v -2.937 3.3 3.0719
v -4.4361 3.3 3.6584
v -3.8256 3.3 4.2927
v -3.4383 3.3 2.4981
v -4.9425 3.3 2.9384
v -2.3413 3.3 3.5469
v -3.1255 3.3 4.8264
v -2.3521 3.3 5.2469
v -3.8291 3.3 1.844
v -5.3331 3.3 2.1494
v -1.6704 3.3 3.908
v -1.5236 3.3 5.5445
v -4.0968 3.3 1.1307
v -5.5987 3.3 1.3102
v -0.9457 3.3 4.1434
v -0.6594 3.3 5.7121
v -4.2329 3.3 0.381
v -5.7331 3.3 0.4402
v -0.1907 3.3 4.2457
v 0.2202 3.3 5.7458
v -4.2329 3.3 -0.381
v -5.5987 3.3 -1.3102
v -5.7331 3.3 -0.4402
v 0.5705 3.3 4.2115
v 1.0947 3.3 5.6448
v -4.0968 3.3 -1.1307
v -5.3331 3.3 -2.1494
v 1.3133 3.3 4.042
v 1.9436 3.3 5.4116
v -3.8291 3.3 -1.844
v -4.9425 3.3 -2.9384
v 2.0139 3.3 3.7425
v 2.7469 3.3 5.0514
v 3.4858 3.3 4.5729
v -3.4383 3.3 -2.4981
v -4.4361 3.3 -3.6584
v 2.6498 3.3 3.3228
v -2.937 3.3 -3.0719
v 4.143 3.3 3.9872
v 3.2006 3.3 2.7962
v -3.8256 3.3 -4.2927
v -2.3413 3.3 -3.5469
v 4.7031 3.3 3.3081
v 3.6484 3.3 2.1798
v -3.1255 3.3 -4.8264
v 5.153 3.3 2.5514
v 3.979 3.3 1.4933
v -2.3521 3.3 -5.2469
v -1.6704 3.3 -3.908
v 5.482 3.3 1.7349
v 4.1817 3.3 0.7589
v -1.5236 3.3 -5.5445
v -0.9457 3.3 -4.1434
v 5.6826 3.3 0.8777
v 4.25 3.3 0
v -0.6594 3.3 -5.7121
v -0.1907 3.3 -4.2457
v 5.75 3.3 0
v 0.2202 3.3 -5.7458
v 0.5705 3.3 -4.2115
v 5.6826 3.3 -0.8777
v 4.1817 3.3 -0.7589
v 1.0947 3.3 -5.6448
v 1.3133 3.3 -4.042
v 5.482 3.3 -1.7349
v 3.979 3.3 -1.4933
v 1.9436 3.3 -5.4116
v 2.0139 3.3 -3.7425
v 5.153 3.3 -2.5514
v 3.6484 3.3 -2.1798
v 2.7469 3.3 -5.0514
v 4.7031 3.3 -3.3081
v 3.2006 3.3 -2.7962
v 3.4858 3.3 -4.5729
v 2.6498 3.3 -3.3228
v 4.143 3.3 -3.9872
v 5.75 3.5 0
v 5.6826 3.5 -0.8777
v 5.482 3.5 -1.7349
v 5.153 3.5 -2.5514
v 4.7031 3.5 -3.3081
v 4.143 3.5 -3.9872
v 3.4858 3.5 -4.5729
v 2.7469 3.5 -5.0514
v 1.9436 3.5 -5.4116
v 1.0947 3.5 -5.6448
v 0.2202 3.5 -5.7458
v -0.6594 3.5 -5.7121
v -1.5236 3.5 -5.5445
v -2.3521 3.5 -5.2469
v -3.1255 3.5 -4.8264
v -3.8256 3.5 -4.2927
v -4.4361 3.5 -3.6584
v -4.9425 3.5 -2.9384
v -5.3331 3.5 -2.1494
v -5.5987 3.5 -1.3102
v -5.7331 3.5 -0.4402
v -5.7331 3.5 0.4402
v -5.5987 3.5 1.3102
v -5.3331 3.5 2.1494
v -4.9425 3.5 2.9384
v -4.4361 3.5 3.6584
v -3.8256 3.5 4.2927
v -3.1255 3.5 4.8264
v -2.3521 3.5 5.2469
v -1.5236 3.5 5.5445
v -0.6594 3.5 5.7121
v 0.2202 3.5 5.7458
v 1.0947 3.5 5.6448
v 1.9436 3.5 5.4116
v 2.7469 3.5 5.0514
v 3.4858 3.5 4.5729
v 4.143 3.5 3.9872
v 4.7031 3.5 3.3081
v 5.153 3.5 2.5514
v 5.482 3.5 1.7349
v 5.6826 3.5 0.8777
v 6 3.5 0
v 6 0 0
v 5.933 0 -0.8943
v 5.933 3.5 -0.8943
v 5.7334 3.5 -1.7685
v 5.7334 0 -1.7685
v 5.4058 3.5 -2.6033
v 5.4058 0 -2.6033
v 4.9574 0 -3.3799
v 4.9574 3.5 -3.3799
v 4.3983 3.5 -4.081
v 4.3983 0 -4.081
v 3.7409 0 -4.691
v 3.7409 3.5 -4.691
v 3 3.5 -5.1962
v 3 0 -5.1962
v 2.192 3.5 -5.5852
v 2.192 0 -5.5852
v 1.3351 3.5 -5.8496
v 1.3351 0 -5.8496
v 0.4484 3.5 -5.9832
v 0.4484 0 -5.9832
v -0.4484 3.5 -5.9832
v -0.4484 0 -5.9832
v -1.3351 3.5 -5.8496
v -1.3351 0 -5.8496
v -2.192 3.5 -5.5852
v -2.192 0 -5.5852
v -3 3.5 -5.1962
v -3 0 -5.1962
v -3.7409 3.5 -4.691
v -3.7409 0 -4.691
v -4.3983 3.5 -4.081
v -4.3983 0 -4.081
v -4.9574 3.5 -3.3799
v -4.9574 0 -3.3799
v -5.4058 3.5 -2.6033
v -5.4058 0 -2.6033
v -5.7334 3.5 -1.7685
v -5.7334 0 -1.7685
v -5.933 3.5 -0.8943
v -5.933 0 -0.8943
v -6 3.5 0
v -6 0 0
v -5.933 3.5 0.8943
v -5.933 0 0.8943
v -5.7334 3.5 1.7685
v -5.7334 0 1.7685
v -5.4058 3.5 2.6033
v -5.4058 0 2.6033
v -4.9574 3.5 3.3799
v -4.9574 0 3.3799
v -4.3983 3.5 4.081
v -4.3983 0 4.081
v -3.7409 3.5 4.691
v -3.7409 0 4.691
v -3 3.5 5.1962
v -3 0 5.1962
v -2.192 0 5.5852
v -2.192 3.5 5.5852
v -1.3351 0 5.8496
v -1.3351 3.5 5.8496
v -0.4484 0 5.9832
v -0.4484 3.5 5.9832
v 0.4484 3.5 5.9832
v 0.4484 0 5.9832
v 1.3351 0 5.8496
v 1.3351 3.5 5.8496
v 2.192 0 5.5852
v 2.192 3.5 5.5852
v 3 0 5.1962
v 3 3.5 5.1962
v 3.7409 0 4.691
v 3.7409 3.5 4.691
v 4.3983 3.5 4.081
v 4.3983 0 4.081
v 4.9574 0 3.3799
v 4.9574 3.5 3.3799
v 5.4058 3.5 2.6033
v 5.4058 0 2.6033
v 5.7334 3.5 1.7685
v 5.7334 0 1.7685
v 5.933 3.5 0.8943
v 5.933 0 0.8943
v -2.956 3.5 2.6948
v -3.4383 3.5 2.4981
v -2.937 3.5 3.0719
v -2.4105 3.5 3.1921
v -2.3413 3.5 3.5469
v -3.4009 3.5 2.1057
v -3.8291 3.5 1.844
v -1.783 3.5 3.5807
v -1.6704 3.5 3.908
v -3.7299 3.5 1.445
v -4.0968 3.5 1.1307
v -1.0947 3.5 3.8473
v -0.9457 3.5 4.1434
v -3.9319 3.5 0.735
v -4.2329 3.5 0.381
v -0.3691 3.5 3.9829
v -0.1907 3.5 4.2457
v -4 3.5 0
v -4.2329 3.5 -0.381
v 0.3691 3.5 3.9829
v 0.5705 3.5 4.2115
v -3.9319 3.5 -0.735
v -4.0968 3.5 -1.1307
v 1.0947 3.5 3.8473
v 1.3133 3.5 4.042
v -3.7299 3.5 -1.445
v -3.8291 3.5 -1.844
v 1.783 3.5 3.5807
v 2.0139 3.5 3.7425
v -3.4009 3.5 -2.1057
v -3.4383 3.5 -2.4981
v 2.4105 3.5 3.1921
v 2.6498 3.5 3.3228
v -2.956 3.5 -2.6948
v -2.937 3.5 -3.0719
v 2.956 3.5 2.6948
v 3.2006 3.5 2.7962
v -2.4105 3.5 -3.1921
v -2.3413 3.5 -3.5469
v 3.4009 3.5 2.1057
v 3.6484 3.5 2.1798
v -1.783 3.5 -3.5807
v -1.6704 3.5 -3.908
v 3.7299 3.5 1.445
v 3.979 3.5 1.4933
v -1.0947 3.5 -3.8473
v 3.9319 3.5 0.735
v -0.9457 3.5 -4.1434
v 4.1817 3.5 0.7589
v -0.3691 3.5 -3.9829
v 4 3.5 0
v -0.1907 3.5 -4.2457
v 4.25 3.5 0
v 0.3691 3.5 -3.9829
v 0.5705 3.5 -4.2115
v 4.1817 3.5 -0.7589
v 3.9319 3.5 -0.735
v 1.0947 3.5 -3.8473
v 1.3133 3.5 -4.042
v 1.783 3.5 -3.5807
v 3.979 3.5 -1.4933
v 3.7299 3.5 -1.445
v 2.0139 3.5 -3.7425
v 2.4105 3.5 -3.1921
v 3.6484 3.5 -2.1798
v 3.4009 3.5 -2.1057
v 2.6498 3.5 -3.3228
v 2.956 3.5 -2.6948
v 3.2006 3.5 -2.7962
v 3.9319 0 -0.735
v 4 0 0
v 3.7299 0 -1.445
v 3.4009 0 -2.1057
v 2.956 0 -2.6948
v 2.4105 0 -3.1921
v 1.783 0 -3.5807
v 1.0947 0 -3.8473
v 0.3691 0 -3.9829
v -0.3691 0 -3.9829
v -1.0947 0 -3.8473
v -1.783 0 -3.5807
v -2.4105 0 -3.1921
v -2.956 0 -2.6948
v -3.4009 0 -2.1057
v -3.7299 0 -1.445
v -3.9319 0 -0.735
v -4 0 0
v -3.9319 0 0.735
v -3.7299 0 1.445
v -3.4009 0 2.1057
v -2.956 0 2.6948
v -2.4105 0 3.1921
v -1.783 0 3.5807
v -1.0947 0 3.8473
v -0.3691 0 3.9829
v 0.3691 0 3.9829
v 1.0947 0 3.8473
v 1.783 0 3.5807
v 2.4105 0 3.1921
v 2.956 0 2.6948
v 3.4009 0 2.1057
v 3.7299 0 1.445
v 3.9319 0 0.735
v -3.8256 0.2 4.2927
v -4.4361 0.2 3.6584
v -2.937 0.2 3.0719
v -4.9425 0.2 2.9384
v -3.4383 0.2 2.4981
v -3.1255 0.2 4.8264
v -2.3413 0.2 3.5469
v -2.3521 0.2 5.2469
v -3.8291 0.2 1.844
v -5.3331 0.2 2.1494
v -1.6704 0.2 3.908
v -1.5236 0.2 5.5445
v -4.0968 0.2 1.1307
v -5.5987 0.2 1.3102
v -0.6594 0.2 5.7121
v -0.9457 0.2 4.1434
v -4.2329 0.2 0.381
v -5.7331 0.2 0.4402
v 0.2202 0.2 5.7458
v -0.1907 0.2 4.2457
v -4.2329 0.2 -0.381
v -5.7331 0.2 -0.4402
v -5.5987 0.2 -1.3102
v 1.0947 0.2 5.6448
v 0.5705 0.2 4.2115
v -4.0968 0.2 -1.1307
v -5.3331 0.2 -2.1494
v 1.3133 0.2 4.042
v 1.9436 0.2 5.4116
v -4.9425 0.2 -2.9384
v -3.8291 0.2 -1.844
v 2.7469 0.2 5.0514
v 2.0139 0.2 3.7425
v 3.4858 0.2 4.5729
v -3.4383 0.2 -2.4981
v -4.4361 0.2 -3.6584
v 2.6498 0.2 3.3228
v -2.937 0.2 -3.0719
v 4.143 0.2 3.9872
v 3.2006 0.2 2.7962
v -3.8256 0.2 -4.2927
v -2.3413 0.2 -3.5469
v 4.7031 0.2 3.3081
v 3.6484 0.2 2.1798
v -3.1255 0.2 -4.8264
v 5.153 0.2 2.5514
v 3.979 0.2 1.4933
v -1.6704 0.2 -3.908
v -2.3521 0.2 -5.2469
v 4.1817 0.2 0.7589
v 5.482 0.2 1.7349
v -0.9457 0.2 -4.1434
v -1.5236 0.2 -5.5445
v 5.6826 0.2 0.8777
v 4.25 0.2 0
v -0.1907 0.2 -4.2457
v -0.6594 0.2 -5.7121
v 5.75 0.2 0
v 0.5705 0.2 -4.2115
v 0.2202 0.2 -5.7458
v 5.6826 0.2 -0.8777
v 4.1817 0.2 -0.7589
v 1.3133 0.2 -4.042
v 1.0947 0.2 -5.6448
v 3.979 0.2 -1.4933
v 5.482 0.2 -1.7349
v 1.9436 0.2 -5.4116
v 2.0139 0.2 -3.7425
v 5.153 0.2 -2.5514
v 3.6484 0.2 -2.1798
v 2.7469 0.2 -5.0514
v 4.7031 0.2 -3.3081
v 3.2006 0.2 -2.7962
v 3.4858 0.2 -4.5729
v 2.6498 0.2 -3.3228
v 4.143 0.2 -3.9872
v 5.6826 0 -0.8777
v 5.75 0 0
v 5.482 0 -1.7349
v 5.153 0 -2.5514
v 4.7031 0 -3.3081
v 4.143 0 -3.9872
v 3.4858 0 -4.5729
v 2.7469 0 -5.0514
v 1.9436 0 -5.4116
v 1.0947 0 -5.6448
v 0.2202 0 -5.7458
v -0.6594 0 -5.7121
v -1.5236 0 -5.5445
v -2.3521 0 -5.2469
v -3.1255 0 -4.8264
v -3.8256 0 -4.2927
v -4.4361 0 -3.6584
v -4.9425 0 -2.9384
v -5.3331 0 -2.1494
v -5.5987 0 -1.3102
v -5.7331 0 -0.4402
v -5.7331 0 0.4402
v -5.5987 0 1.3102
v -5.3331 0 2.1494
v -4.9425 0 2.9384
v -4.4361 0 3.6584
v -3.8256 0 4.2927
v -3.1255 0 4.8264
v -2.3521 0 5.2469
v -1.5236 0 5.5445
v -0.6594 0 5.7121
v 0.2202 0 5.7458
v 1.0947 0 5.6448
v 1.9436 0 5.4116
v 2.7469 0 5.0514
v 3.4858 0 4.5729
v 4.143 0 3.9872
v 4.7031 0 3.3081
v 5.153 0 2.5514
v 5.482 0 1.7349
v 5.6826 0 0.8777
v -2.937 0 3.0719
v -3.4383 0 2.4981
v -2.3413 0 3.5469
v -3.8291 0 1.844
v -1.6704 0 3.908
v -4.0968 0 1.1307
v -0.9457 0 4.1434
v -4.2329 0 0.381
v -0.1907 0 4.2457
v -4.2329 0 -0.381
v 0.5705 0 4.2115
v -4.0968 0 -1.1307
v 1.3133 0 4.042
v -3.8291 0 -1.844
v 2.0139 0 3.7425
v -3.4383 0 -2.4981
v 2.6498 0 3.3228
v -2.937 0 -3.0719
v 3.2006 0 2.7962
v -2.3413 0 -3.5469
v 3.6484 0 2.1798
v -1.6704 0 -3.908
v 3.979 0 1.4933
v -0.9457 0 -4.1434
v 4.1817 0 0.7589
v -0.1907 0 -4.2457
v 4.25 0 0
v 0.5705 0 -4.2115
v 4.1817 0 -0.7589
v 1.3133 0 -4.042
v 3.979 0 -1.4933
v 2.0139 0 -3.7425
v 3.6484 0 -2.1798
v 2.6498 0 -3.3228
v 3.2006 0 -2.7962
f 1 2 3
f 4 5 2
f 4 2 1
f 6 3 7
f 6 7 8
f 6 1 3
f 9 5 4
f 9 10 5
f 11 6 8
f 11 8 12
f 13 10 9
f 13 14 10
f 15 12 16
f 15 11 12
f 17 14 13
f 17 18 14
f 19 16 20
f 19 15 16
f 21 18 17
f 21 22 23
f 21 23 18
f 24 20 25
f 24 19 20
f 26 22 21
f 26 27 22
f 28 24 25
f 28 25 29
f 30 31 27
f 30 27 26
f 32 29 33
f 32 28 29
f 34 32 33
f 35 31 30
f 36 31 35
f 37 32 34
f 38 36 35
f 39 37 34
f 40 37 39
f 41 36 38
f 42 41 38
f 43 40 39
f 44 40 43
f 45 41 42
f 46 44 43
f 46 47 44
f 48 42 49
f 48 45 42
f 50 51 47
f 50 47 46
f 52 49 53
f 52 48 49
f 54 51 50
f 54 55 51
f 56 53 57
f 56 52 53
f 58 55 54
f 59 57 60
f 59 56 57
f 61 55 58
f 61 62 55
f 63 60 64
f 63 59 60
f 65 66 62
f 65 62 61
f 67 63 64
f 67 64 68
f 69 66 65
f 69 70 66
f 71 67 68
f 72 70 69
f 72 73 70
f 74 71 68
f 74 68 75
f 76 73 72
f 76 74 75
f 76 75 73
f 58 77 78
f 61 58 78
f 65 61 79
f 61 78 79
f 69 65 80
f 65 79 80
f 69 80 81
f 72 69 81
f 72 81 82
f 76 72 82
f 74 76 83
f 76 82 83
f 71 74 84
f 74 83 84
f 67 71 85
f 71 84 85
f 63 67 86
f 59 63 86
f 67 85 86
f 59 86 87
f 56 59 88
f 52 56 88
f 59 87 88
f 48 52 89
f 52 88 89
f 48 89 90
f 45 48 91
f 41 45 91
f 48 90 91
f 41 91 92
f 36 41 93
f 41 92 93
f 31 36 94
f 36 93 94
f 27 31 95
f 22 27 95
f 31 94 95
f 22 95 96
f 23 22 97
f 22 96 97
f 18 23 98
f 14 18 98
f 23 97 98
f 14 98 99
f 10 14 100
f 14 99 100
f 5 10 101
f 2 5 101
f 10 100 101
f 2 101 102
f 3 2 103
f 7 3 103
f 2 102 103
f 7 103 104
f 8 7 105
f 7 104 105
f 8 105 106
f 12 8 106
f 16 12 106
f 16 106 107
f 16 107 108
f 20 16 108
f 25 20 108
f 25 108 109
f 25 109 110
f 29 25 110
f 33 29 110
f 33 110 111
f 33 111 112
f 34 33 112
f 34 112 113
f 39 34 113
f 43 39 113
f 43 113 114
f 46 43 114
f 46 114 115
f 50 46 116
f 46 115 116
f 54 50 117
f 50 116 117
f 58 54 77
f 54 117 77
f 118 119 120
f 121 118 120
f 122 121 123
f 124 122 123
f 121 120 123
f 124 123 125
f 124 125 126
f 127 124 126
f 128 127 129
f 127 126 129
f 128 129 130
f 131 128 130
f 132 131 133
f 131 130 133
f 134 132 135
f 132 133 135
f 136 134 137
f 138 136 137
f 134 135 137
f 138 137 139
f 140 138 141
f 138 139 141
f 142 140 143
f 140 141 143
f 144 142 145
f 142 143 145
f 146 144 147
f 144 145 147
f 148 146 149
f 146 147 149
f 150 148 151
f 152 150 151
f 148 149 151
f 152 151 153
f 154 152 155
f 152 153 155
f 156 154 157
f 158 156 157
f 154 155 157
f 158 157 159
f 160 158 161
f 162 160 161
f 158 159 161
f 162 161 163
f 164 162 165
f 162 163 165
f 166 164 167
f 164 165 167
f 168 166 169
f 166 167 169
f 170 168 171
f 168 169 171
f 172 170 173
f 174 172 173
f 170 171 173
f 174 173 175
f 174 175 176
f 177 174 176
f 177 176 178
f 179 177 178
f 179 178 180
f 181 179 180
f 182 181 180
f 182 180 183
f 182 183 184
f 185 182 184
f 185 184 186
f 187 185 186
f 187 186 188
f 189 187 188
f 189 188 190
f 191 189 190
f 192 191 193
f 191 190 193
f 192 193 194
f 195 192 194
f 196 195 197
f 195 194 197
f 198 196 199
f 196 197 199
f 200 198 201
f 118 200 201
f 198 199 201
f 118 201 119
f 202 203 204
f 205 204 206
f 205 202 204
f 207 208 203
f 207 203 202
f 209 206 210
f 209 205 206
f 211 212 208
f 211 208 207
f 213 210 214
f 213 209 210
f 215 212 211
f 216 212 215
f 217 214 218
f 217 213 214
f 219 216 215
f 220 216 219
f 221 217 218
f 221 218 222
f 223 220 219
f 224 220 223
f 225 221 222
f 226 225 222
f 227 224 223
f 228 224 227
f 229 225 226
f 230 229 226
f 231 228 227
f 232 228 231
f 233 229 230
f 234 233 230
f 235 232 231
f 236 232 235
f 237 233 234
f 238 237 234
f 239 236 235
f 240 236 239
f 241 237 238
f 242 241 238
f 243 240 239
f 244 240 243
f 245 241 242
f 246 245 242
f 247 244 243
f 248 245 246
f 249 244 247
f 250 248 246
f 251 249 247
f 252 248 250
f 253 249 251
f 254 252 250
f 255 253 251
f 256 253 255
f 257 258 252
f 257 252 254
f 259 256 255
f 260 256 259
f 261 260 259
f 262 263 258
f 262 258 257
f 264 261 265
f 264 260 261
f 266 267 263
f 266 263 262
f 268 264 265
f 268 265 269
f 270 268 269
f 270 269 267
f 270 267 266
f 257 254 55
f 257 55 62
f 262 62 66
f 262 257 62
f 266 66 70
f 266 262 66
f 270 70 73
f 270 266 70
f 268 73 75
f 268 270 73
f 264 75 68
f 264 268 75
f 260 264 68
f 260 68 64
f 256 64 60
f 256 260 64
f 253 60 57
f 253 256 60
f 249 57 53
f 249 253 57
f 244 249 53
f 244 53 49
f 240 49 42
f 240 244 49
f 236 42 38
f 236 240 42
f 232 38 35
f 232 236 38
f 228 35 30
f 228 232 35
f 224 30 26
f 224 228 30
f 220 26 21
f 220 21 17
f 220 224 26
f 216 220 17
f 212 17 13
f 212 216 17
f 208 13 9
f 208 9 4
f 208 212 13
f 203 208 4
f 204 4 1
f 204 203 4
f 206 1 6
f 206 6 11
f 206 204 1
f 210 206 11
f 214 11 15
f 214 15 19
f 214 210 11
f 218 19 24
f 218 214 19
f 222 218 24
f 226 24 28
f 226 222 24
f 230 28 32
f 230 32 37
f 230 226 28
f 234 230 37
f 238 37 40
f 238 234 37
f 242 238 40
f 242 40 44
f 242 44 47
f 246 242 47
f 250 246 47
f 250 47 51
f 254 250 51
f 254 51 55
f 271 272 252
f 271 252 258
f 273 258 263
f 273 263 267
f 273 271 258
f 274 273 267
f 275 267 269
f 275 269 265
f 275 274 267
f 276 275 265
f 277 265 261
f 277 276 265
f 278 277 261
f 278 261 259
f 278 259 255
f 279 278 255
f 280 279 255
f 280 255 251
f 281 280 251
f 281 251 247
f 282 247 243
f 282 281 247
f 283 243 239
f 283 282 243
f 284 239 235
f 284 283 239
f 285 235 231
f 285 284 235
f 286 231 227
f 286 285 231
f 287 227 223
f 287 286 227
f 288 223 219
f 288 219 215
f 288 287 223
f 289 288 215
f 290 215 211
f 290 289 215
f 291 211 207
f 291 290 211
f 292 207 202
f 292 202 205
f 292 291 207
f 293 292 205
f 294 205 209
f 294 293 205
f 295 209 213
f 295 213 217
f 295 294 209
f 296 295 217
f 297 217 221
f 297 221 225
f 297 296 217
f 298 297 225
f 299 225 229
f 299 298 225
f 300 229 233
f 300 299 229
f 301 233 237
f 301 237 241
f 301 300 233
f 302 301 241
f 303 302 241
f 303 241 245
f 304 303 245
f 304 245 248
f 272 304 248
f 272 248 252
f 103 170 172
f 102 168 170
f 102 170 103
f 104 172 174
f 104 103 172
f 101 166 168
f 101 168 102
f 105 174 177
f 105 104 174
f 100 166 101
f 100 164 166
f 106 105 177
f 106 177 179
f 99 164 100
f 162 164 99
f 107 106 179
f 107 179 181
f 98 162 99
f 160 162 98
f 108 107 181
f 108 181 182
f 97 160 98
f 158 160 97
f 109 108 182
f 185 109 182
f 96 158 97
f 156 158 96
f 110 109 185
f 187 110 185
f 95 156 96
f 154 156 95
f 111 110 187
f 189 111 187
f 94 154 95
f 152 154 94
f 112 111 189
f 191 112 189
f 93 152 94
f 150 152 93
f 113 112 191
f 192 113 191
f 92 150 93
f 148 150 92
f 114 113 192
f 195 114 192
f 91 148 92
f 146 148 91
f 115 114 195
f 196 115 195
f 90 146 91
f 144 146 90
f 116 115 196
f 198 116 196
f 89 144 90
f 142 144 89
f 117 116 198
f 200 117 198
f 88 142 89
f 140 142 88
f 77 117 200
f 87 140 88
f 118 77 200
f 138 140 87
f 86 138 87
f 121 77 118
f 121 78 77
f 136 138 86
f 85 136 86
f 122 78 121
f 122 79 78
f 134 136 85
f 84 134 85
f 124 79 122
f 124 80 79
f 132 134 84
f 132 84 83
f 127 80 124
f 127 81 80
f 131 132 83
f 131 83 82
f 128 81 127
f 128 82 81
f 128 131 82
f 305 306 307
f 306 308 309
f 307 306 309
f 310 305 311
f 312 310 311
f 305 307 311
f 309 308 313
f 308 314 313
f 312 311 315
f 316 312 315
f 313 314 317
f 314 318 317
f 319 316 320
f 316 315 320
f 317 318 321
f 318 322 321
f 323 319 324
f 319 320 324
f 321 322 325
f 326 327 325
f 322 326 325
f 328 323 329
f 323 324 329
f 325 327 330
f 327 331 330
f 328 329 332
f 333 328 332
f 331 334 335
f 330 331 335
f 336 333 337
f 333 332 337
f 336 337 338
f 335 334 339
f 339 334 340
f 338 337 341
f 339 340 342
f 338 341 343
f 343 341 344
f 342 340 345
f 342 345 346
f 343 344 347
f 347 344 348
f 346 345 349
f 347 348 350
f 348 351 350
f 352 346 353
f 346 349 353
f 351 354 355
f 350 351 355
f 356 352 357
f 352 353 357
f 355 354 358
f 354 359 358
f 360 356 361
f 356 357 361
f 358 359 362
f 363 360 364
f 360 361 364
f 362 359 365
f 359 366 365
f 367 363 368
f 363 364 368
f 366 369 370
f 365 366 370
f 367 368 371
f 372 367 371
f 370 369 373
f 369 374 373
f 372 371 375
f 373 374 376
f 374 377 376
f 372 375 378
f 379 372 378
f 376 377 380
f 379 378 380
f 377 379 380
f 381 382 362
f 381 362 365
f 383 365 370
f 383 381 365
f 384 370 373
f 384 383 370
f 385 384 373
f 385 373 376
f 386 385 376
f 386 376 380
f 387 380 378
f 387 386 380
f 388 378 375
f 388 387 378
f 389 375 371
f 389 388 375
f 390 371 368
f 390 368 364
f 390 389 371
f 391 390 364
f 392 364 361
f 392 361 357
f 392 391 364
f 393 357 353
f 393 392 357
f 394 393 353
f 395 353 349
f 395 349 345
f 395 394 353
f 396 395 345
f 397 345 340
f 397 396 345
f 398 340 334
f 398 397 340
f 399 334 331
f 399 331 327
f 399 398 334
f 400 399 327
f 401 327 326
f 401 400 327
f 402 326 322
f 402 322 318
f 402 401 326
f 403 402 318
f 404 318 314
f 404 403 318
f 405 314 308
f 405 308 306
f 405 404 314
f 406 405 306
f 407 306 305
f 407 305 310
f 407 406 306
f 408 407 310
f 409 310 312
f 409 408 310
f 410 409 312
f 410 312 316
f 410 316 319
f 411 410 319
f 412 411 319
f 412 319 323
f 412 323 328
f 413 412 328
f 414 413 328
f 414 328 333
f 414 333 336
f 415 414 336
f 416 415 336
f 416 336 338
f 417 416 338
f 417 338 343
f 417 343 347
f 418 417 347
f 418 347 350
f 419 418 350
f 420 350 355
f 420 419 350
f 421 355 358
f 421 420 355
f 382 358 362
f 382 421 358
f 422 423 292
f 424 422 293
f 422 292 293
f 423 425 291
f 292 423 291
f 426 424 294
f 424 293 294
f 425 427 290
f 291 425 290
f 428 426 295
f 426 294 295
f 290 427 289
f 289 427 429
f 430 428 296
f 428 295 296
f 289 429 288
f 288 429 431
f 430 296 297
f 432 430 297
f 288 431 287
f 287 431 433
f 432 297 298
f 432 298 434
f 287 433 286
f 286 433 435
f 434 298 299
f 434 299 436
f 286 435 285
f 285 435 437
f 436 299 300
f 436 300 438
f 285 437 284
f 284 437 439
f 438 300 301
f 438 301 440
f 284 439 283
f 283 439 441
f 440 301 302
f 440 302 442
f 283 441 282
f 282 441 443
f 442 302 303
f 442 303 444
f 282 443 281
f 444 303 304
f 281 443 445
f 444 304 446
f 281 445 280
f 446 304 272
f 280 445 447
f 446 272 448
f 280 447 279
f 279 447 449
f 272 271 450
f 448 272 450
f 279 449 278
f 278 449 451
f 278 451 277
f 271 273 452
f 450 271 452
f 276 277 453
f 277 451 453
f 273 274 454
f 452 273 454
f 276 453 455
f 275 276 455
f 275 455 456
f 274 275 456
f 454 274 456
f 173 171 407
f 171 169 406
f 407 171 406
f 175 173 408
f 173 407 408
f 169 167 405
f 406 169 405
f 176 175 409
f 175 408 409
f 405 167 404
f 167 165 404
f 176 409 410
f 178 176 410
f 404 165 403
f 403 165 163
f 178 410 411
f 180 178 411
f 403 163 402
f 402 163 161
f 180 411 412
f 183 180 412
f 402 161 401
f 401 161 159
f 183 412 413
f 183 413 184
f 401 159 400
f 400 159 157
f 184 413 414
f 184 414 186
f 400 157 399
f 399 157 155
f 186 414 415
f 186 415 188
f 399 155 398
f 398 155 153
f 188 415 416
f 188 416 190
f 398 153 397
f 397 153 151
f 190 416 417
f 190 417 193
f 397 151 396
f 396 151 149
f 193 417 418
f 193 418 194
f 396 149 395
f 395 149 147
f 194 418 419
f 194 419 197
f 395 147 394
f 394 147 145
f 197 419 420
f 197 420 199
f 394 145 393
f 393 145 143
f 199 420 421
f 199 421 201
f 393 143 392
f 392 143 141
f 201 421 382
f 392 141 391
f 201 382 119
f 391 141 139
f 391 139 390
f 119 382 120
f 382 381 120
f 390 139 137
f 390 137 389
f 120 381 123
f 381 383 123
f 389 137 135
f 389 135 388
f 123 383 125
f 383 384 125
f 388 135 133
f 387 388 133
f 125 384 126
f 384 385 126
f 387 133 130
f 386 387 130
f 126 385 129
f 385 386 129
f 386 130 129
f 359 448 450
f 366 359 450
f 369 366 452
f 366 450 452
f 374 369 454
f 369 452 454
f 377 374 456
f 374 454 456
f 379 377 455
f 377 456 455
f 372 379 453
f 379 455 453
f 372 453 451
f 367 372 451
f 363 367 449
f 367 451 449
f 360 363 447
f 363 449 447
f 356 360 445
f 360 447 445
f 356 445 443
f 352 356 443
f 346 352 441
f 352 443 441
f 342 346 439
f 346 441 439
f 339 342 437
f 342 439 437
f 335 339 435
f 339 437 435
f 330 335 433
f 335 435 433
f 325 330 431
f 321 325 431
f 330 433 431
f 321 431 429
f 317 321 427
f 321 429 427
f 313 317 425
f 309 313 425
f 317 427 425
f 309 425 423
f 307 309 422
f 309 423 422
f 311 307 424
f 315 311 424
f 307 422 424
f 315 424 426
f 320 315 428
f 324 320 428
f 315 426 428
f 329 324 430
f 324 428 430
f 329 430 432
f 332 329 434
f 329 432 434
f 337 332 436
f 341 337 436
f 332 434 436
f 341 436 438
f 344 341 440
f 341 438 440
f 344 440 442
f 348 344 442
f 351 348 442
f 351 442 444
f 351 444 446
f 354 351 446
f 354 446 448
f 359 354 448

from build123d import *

# Parameters (mm, degrees)
SKETCH1_R           = 6
SKETCH1_R_2         = 4
BOSS_EXTRUDE1_DEPTH = 3.5
SKETCH2_R           = 5.75
SKETCH2_R_2         = 4.25
CUT_EXTRUDE1_DEPTH  = 0.2
CUT_EXTRUDE2_START  = -3.5
SKETCH2_2_R         = 5.75
SKETCH2_2_R_2       = 4.25
CUT_EXTRUDE2_DEPTH  = 0.2


with BuildPart() as part:
    # Sketch1 → Boss-Extrude1 (new body)
    with BuildSketch(Plane(origin=(0, 0, 0), x_dir=(1, 0, 0), z_dir=(0, 1, 0))):
        Circle(SKETCH1_R)
        Circle(SKETCH1_R_2, mode=Mode.SUBTRACT)
    extrude(amount=BOSS_EXTRUDE1_DEPTH)

    # Sketch2 → Cut-Extrude1 (cut)
    with BuildSketch(Plane(origin=(0, 3.5, 0), x_dir=(1, 0, 0), z_dir=(0, 1, 0))):
        Circle(SKETCH2_R)
        Circle(SKETCH2_R_2, mode=Mode.SUBTRACT)
    extrude(amount=-CUT_EXTRUDE1_DEPTH, mode=Mode.SUBTRACT)

    # Sketch2<2> → Cut-Extrude2 (cut)
    with BuildSketch(Plane(origin=(0, 3.5, 0), x_dir=(1, 0, 0), z_dir=(0, 1, 0)).offset(CUT_EXTRUDE2_START)):
        Circle(SKETCH2_2_R)
        Circle(SKETCH2_2_R_2, mode=Mode.SUBTRACT)
    extrude(amount=CUT_EXTRUDE2_DEPTH, mode=Mode.SUBTRACT)


solid = part.part
